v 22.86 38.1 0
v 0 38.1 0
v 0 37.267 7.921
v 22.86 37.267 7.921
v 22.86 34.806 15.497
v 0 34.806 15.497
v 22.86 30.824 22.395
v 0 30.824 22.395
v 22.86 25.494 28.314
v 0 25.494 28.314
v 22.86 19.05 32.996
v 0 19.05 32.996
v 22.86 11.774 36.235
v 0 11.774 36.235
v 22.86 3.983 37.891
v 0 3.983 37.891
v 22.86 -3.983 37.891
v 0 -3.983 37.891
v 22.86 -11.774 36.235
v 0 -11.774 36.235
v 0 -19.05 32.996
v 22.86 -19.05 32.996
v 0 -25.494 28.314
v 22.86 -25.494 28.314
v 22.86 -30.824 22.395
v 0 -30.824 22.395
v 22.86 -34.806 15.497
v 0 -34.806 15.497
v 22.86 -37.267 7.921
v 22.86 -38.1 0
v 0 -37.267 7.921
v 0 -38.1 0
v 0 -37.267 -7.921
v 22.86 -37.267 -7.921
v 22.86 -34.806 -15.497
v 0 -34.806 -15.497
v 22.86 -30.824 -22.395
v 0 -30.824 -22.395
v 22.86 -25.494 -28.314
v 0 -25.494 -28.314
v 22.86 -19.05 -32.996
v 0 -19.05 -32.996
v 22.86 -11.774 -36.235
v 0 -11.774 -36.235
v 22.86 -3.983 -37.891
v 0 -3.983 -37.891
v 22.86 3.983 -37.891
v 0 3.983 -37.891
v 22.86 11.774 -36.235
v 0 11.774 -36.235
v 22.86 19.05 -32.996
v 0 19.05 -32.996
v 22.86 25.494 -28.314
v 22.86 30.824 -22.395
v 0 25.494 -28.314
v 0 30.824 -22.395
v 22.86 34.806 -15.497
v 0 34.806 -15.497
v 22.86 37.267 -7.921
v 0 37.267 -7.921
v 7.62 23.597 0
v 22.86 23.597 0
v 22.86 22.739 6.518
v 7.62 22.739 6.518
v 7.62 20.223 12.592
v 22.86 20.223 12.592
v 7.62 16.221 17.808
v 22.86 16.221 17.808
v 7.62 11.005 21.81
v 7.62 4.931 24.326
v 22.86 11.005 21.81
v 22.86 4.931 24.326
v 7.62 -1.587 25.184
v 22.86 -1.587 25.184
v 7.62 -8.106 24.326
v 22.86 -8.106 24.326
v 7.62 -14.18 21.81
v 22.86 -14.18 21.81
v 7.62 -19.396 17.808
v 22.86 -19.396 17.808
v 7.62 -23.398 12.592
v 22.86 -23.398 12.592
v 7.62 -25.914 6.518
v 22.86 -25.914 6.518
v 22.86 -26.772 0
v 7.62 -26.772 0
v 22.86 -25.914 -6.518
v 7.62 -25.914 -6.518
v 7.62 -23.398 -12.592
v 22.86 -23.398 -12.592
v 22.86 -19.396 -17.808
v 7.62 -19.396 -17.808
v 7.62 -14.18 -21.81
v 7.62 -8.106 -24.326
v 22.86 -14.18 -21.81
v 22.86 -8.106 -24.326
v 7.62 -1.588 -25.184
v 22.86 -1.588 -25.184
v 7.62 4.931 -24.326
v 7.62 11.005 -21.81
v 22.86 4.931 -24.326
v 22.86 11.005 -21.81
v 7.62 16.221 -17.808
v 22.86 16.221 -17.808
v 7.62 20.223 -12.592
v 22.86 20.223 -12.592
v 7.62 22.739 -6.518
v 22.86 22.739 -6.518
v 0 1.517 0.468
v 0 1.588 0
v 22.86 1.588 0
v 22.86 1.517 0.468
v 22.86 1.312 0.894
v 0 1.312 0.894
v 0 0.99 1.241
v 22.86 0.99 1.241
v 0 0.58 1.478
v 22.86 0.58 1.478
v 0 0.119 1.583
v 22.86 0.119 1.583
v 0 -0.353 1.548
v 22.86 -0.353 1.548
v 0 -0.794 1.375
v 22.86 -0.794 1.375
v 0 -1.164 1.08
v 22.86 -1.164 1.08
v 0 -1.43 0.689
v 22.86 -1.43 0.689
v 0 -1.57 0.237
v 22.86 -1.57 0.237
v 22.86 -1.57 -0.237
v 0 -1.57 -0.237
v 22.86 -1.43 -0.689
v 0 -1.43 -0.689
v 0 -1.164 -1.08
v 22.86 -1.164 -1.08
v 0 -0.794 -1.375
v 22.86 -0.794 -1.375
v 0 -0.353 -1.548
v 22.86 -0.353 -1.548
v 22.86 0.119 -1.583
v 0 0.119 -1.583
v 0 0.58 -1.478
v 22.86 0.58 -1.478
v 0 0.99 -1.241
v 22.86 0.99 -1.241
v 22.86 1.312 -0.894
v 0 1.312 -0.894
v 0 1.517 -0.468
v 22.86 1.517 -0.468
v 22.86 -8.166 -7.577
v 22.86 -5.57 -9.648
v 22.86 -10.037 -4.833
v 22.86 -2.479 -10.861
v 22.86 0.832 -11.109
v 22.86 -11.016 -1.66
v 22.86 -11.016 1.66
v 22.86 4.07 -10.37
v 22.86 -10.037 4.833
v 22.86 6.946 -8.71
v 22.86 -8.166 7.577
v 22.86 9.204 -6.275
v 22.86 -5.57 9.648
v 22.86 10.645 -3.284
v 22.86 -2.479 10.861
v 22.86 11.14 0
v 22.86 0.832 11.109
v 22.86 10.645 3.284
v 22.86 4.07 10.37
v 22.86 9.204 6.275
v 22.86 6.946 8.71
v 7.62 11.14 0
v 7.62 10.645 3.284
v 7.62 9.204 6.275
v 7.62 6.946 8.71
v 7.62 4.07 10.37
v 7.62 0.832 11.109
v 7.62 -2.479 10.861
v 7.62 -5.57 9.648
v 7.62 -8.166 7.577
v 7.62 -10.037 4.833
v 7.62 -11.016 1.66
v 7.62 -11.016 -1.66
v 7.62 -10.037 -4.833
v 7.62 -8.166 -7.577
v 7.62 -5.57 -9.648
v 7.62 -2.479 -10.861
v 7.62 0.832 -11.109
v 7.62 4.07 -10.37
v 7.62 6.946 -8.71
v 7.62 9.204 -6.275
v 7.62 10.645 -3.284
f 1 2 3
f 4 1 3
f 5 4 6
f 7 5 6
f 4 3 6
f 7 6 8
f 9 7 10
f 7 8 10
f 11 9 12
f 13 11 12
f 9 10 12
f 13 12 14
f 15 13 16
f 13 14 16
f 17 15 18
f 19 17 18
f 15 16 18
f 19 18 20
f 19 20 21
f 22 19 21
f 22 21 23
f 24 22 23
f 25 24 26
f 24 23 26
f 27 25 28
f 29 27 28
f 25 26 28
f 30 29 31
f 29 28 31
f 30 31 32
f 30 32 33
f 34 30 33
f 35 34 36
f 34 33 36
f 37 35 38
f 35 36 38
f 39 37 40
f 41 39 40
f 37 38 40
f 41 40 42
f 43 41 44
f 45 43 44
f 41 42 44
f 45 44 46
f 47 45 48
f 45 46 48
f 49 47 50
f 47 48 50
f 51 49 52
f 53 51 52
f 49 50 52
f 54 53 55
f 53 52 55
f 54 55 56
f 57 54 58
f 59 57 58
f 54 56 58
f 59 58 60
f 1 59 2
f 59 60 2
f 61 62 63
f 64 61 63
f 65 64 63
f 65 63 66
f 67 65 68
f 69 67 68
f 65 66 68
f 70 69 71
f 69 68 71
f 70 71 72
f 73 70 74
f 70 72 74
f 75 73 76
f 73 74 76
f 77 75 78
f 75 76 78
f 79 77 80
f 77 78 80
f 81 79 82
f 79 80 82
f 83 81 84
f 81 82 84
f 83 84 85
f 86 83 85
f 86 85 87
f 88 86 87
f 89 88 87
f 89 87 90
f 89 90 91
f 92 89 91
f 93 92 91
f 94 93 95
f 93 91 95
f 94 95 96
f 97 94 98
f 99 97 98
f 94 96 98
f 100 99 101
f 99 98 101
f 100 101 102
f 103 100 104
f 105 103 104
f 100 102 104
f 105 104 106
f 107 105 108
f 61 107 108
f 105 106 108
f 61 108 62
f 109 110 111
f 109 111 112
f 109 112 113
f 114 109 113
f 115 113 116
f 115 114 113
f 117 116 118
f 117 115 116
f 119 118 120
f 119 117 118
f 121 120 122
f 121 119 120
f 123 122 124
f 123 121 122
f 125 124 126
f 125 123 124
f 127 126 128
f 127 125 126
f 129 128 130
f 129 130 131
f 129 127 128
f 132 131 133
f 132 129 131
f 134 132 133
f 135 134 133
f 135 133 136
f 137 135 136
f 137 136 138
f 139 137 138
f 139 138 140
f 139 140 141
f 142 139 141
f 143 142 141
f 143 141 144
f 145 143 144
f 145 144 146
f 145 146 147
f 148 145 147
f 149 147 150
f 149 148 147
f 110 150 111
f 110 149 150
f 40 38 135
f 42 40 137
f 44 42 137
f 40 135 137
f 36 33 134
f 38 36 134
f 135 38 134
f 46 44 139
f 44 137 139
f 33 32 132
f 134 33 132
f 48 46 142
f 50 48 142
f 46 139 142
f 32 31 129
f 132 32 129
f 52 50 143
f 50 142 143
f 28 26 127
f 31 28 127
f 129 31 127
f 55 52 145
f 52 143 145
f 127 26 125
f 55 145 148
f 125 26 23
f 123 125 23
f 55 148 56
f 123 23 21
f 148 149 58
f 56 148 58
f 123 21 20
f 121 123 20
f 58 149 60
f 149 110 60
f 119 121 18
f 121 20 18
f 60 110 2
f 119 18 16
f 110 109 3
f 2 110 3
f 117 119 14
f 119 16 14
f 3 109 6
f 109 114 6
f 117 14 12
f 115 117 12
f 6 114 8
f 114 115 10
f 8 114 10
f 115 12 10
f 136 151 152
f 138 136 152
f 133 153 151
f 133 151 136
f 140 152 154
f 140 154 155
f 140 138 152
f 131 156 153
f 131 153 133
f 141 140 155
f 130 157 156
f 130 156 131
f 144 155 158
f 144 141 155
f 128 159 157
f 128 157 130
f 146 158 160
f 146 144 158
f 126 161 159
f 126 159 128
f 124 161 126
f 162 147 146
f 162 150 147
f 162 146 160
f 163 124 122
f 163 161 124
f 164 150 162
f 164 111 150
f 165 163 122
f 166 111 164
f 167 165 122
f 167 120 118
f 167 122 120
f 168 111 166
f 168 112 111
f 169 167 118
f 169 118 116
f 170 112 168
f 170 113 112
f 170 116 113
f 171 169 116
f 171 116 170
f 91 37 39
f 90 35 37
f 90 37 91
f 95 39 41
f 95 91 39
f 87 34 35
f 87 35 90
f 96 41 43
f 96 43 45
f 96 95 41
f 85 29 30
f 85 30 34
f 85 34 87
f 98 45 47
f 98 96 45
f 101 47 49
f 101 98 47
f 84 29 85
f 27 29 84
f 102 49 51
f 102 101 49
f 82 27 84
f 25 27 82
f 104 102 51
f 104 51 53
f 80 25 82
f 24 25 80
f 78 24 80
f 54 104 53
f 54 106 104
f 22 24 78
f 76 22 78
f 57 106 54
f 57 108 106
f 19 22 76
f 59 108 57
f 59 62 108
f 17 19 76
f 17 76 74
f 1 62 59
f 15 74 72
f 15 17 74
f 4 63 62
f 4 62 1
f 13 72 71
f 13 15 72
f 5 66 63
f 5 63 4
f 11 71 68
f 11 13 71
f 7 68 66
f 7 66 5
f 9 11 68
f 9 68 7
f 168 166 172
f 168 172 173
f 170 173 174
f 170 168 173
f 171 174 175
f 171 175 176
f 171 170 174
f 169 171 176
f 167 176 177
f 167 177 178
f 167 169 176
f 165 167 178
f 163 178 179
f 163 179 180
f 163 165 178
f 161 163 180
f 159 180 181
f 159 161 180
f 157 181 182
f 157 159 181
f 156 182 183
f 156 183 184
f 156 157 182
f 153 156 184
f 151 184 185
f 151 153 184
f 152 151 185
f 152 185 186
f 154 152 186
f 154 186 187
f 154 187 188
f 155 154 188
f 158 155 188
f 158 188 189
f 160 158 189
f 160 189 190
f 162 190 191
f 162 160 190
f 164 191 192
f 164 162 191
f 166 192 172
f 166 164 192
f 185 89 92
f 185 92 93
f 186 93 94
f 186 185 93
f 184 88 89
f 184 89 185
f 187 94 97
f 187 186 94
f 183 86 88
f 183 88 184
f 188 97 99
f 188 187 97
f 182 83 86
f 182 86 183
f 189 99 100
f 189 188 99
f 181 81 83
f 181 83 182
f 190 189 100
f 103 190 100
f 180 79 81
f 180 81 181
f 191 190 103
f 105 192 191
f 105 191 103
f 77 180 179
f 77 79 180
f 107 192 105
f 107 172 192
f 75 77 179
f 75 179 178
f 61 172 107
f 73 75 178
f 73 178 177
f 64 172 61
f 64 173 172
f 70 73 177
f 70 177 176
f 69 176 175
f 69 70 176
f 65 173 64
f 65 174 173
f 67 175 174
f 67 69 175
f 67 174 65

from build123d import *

# Parameters (mm, degrees)
F0_R     = 38.1
F0_R_2   = 1.5875
F1_DEPTH = 22.86
F2_R     = 25.184471
F2_R_2   = 11.140075
F3_DEPTH = 15.24


with BuildPart() as f1:
    # F0 (on Right) → F1 (new body)
    with BuildSketch(Plane.YZ):
        Circle(F0_R)
        Circle(F0_R_2, mode=Mode.SUBTRACT)
    extrude(amount=F1_DEPTH)

    # F2 (on face) → F3 (cut)
    with BuildSketch(Plane.YZ.offset(22.86)):
        with Locations((-1.5875, 0)):
            Circle(F2_R)
        Circle(F2_R_2, mode=Mode.SUBTRACT)
    extrude(amount=-F3_DEPTH, mode=Mode.SUBTRACT)


solid = f1.part
